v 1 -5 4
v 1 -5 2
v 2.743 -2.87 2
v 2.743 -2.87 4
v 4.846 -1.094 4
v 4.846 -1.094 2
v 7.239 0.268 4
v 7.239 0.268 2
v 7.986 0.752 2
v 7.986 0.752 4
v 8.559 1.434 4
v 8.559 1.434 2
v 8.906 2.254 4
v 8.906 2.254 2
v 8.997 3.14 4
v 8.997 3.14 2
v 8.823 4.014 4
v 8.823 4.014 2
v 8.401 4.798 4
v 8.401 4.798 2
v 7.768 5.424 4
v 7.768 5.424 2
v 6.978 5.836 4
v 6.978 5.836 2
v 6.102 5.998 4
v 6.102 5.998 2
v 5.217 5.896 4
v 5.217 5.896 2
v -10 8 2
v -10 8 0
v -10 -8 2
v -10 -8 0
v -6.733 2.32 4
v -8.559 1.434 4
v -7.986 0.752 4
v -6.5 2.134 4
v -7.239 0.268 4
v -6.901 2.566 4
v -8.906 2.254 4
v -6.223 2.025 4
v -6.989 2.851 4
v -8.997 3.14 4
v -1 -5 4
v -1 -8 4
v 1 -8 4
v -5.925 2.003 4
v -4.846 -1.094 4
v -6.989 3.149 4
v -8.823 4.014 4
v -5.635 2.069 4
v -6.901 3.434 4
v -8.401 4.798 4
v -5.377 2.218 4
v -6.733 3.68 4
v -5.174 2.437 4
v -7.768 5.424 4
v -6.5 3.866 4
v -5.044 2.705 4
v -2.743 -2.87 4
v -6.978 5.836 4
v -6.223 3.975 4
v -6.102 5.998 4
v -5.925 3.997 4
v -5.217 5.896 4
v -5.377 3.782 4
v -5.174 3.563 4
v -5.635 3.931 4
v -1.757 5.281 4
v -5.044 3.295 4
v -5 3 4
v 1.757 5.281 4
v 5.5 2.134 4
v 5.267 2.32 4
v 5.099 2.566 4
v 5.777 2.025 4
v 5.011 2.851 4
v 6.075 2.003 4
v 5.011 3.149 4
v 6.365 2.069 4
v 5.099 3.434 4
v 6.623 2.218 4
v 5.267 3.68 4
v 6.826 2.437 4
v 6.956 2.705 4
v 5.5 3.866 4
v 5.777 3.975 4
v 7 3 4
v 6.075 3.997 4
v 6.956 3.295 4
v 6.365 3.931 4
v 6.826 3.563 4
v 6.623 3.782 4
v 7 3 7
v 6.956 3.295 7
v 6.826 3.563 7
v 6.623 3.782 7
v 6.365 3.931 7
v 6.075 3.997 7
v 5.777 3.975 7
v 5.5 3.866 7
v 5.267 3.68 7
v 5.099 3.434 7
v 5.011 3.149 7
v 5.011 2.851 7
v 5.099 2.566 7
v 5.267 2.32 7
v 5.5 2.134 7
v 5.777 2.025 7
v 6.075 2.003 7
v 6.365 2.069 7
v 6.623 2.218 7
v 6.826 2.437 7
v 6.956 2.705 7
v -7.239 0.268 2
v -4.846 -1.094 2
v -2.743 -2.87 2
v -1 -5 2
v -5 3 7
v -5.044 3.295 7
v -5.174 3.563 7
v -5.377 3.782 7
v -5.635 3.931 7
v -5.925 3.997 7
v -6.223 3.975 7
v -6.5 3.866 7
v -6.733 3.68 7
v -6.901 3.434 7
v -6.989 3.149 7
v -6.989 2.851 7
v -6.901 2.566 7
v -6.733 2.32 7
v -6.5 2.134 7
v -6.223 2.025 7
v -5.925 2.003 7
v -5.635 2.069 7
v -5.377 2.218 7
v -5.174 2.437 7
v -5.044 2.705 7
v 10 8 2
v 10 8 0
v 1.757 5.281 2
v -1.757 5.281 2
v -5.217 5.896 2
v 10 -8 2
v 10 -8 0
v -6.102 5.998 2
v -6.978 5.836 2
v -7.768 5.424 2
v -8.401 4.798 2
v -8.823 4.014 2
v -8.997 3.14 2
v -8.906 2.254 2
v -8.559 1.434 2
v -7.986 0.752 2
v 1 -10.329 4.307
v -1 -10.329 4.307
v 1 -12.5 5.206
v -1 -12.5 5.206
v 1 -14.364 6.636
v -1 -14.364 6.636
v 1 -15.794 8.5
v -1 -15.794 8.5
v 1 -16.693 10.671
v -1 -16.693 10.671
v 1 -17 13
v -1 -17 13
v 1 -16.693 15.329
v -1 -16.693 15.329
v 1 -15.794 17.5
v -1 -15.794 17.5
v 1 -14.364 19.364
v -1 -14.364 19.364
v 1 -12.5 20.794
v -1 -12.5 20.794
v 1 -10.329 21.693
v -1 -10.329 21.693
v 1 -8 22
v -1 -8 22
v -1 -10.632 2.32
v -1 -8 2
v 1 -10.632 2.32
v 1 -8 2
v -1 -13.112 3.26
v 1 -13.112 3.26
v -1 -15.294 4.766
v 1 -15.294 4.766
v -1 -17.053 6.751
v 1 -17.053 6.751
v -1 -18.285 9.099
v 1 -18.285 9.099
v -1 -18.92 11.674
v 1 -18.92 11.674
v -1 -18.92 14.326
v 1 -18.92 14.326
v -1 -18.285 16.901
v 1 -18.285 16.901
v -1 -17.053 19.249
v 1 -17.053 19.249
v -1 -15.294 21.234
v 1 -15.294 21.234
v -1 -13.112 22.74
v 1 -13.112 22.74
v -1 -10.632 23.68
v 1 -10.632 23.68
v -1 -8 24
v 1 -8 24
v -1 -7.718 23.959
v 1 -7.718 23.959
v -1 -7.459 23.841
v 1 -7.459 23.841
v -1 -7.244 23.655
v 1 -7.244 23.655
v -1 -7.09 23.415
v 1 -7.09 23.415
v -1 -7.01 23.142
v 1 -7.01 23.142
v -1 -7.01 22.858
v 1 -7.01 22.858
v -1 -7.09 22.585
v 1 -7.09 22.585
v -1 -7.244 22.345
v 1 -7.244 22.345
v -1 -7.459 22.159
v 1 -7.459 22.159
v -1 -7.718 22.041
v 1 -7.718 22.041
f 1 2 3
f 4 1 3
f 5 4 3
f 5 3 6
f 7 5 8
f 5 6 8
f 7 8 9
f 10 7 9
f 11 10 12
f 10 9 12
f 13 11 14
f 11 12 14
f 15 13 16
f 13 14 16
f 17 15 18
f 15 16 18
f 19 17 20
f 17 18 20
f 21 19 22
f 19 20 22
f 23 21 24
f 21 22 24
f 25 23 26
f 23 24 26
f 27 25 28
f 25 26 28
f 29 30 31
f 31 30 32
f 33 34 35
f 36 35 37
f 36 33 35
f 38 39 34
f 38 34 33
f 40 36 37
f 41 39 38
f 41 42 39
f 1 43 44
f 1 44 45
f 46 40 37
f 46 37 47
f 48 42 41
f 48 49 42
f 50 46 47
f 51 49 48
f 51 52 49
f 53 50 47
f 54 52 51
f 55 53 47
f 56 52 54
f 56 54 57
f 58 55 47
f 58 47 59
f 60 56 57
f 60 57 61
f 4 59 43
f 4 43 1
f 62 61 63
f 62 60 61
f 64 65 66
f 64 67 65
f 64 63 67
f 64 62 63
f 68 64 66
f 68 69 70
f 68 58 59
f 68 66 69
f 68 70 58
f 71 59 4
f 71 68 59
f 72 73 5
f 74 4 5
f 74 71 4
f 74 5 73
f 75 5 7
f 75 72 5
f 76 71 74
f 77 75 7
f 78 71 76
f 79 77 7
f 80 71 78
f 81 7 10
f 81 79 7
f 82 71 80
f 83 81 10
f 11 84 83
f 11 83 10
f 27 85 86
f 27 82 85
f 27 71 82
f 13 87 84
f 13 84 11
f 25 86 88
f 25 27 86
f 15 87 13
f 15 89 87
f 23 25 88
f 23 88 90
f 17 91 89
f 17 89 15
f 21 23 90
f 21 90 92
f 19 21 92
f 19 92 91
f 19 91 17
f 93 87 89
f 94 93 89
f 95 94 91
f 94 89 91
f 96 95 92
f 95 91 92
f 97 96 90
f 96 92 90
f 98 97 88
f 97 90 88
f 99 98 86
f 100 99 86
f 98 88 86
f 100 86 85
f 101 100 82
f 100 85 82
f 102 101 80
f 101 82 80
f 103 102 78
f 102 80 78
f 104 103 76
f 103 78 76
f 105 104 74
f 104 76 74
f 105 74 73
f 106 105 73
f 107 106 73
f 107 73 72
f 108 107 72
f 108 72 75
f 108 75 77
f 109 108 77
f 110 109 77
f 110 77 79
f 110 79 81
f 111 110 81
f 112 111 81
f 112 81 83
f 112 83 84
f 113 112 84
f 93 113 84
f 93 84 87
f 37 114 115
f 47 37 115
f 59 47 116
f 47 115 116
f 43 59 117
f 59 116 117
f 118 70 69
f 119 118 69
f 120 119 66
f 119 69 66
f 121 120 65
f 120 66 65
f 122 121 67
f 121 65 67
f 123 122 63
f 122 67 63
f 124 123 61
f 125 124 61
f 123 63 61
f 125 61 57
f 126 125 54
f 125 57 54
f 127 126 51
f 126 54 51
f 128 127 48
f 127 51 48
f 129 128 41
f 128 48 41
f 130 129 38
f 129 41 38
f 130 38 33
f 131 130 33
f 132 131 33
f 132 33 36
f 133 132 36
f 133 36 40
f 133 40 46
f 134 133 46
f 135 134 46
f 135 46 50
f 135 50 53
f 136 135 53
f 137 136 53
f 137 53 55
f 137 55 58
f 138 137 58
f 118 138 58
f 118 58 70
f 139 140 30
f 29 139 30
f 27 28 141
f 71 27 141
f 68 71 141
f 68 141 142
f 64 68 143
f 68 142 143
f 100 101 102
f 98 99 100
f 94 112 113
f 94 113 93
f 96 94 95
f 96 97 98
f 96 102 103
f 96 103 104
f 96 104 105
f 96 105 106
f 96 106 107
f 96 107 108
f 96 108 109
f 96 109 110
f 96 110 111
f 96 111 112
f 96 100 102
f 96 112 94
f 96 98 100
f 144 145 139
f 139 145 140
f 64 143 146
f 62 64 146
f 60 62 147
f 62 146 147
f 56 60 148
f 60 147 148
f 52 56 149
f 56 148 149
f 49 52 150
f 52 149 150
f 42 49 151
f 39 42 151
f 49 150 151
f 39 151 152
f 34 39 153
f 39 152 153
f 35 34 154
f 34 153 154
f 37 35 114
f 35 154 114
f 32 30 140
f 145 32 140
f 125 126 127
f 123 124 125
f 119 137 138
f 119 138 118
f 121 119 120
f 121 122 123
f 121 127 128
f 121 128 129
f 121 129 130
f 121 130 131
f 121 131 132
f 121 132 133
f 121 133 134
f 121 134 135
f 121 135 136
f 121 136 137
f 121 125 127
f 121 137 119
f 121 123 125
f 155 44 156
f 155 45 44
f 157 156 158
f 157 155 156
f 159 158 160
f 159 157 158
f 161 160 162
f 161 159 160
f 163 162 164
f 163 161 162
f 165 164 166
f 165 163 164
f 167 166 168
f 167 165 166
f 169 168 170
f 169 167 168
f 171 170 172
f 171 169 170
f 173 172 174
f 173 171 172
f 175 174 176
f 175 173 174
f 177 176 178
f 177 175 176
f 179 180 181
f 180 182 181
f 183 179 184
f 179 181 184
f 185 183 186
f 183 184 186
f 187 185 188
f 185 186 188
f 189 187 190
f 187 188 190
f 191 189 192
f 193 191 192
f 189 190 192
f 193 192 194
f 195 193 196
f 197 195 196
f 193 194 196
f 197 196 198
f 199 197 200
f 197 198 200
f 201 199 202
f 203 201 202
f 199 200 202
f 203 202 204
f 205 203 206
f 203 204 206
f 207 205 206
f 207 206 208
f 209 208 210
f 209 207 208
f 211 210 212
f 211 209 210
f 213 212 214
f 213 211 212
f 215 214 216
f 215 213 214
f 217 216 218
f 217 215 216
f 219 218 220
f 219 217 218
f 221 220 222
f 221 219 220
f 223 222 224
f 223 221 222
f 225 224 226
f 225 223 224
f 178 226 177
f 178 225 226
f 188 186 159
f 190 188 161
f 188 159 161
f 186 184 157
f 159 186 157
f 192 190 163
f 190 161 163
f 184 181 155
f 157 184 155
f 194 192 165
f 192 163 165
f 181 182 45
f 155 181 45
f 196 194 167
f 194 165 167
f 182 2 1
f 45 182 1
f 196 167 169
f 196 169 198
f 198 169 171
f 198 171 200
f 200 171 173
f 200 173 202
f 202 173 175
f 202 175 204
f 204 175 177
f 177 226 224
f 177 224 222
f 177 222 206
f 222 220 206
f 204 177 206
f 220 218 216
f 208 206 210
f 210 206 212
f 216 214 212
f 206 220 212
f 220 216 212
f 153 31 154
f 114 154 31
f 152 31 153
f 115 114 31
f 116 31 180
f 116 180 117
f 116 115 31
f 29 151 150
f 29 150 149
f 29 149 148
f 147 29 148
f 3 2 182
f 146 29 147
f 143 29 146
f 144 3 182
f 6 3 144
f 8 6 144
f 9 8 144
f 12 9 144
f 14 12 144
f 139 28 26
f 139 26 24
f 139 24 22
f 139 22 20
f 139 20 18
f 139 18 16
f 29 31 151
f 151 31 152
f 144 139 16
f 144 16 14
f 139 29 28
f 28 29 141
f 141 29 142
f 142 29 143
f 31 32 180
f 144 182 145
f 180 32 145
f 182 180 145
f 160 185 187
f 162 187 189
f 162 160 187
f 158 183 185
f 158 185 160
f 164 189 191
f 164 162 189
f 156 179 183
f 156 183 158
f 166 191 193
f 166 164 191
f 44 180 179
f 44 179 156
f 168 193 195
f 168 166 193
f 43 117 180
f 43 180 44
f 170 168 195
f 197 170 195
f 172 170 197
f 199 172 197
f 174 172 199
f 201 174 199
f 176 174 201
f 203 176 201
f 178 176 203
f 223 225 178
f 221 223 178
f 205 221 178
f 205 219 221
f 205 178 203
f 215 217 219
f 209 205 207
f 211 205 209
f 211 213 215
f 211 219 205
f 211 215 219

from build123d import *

# Parameters (mm, degrees)
BOSS_EXTRUDE2_DEPTH = 2
SKETCH1_5_R         = 1
BOSS_EXTRUDE3_DEPTH = 4
SKETCH1_6_R         = 1
BOSS_EXTRUDE4_DEPTH = 7
SKETCH2_W           = 2
SKETCH2_H           = 2
REVOLVE1_ANGLE      = 180
SKETCH3_R           = 1
BOSS_EXTRUDE5_DEPTH = 2


with BuildPart() as part:
    # Sketch1 → Boss-Extrude2 (new body)
    with BuildSketch(Plane.XY):
        with BuildLine():
            Line((-10, 8), (-10, -8))
            Line((-10, -8), (-1, -8))
            Line((-1, -8), (-1, -5))
            ThreePointArc((-1, -5), (-3.753951843, -1.933561128), (-7.238522191, 0.267590297))
            ThreePointArc((-7.238522191, 0.267590297), (-8.82348314, 4.013875218), (-5.217391304, 5.896122171))
            ThreePointArc((-5.217391304, 5.896122171), (0, 5.203603311), (5.217391304, 5.896122171))
            ThreePointArc((5.217391304, 5.896122171), (8.82348314, 4.013875218), (7.238522191, 0.267590297))
            ThreePointArc((7.238522191, 0.267590297), (3.753951843, -1.933561128), (1, -5))
            Line((1, -5), (1, -8))
            Line((1, -8), (10, -8))
            Line((10, -8), (10, 8))
            Line((10, 8), (-10, 8))
        make_face()
    extrude(amount=BOSS_EXTRUDE2_DEPTH)

    # Sketch1<5> → Boss-Extrude3 (add)
    with BuildSketch(Plane.XY):
        with BuildLine():
            Line((-1, -5), (-1, -8))
            Line((-1, -8), (1, -8))
            Line((1, -8), (1, -5))
            ThreePointArc((1, -5), (3.753951843, -1.933561128), (7.238522191, 0.267590297))
            ThreePointArc((7.238522191, 0.267590297), (8.82348314, 4.013875218), (5.217391304, 5.896122171))
            ThreePointArc((5.217391304, 5.896122171), (0, 5.203603311), (-5.217391304, 5.896122171))
            ThreePointArc((-5.217391304, 5.896122171), (-8.82348314, 4.013875218), (-7.238522191, 0.267590297))
            ThreePointArc((-7.238522191, 0.267590297), (-3.753951843, -1.933561128), (-1, -5))
        make_face()
        with Locations((-6, 3)):
            Circle(SKETCH1_5_R, mode=Mode.SUBTRACT)
        with Locations((6, 3)):
            Circle(SKETCH1_5_R, mode=Mode.SUBTRACT)
    extrude(amount=BOSS_EXTRUDE3_DEPTH)

    # Sketch1<6> → Boss-Extrude4 (add)
    with BuildSketch(Plane.XY):
        with Locations((-6, 3)):
            Circle(SKETCH1_6_R)
        with Locations((6, 3)):
            Circle(SKETCH1_6_R)
    extrude(amount=BOSS_EXTRUDE4_DEPTH)

    # Sketch2 → Revolve1 (revolve)
    with BuildSketch(Plane.XZ.offset(8)):
        with Locations((0, 3)):
            Rectangle(SKETCH2_W, SKETCH2_H)
    revolve(axis=Axis((-9.9, -8, 13), (-1, 0, 0)), revolution_arc=REVOLVE1_ANGLE)

    # Sketch3 → Boss-Extrude5 (add)
    with BuildSketch(Plane.ZY.offset(1)):
        with Locations((23, -8)):
            Circle(SKETCH3_R)
    extrude(amount=-BOSS_EXTRUDE5_DEPTH)


solid = part.part
